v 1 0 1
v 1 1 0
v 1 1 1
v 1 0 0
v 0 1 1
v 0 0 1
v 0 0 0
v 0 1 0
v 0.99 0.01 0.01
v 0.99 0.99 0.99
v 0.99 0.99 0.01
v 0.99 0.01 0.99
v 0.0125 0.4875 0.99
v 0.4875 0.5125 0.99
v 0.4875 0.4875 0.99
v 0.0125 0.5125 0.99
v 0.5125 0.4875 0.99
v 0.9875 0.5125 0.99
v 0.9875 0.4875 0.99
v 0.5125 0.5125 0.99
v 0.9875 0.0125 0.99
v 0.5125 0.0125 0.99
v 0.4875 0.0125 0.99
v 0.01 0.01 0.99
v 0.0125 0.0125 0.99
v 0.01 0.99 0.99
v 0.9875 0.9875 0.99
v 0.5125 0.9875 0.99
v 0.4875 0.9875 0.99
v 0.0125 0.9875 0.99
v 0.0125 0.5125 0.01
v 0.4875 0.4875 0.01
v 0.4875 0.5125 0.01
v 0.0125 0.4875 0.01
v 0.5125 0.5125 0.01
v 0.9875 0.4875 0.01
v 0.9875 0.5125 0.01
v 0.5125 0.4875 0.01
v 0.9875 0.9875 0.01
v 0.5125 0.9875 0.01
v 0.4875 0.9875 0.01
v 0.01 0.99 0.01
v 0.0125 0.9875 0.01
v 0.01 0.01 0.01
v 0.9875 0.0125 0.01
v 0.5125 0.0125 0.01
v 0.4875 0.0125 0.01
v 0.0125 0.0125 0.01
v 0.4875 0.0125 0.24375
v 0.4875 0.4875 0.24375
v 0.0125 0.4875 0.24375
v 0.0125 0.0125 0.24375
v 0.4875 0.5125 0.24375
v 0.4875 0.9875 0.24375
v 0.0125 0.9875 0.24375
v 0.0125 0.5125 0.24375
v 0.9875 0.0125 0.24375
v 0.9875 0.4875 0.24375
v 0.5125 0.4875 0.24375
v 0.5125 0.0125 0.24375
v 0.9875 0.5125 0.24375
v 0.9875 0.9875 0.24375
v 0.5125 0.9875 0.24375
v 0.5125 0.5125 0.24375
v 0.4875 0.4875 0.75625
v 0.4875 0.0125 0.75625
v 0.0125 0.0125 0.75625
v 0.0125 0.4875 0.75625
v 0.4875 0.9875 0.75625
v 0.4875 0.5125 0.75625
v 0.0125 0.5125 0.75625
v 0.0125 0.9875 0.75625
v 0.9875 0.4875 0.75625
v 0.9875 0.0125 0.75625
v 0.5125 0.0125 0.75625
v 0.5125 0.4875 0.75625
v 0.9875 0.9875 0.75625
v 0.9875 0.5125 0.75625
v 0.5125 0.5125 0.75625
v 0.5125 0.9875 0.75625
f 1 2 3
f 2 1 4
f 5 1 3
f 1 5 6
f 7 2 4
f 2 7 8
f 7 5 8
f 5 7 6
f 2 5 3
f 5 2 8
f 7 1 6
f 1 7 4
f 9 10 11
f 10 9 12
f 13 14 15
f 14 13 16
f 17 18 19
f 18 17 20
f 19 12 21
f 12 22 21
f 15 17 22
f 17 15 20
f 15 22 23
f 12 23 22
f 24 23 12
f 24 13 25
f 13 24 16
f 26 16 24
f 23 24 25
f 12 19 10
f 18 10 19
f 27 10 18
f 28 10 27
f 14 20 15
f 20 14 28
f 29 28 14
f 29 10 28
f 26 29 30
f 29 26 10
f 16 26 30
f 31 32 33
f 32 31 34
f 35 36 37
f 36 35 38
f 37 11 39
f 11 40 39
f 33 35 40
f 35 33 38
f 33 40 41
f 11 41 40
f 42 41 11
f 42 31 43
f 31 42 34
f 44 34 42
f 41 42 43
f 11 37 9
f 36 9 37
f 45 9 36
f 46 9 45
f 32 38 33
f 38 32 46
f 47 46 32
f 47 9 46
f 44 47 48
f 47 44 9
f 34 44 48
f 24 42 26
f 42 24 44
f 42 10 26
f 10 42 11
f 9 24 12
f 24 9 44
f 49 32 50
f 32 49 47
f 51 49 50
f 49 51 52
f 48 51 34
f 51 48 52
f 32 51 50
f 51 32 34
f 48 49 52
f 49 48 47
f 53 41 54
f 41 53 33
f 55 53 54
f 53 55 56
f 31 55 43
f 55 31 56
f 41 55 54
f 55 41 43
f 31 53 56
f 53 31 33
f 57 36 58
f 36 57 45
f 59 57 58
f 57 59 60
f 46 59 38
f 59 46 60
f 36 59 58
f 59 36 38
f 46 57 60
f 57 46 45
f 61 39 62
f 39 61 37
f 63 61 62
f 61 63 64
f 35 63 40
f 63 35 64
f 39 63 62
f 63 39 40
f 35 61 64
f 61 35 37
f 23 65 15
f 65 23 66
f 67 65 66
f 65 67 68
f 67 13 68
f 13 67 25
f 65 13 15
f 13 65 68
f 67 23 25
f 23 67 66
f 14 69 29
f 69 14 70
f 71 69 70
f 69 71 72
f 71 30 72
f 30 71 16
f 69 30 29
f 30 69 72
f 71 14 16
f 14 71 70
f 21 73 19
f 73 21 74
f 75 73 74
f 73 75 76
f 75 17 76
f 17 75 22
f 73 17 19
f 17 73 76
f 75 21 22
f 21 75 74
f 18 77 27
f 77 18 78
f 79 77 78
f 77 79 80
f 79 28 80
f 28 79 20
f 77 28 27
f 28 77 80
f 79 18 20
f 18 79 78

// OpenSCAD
translate([0.25, 0.25, 0.125]) color([0.19461635406133904, 0.24937487606759356, 0.948798389089598]) cube([0.475, 0.475, 0.2375], center=true);
translate([0.25, 0.75, 0.125]) color([0.463582495028668, 0.8326751819056648, 0.9518902994268229]) cube([0.475, 0.475, 0.2375], center=true);
translate([0.75, 0.25, 0.125]) color([0.6590575290507751, 0.08125165305796267, 0.4650668984349794]) cube([0.475, 0.475, 0.2375], center=true);
translate([0.75, 0.75, 0.125]) color([0.7959185631816963, 0.11921151794914897, 0.3955919798495292]) cube([0.475, 0.475, 0.2375], center=true);
translate([0.25, 0.25, 0.875]) color([0.9677071171037346, 0.6413149765805175, 0.6980206654320958]) cube([0.475, 0.475, 0.2375], center=true);
translate([0.25, 0.75, 0.875]) color([0.8040097371122532, 0.02969664254607307, 0.6148562424214081]) cube([0.475, 0.475, 0.2375], center=true);
translate([0.75, 0.25, 0.875]) color([0.8448719577880454, 0.4679553852673959, 0.08973588053163917]) cube([0.475, 0.475, 0.2375], center=true);
translate([0.75, 0.75, 0.875]) color([0.4324405658485233, 0.6252018299529586, 0.7035550007040374]) cube([0.475, 0.475, 0.2375], center=true);
color([0.3,0.3,0.3,0.3]) difference() { cube([1,1,1]); translate([0.01,0.01,0.01]) cube([0.98,0.98,0.98]); }
